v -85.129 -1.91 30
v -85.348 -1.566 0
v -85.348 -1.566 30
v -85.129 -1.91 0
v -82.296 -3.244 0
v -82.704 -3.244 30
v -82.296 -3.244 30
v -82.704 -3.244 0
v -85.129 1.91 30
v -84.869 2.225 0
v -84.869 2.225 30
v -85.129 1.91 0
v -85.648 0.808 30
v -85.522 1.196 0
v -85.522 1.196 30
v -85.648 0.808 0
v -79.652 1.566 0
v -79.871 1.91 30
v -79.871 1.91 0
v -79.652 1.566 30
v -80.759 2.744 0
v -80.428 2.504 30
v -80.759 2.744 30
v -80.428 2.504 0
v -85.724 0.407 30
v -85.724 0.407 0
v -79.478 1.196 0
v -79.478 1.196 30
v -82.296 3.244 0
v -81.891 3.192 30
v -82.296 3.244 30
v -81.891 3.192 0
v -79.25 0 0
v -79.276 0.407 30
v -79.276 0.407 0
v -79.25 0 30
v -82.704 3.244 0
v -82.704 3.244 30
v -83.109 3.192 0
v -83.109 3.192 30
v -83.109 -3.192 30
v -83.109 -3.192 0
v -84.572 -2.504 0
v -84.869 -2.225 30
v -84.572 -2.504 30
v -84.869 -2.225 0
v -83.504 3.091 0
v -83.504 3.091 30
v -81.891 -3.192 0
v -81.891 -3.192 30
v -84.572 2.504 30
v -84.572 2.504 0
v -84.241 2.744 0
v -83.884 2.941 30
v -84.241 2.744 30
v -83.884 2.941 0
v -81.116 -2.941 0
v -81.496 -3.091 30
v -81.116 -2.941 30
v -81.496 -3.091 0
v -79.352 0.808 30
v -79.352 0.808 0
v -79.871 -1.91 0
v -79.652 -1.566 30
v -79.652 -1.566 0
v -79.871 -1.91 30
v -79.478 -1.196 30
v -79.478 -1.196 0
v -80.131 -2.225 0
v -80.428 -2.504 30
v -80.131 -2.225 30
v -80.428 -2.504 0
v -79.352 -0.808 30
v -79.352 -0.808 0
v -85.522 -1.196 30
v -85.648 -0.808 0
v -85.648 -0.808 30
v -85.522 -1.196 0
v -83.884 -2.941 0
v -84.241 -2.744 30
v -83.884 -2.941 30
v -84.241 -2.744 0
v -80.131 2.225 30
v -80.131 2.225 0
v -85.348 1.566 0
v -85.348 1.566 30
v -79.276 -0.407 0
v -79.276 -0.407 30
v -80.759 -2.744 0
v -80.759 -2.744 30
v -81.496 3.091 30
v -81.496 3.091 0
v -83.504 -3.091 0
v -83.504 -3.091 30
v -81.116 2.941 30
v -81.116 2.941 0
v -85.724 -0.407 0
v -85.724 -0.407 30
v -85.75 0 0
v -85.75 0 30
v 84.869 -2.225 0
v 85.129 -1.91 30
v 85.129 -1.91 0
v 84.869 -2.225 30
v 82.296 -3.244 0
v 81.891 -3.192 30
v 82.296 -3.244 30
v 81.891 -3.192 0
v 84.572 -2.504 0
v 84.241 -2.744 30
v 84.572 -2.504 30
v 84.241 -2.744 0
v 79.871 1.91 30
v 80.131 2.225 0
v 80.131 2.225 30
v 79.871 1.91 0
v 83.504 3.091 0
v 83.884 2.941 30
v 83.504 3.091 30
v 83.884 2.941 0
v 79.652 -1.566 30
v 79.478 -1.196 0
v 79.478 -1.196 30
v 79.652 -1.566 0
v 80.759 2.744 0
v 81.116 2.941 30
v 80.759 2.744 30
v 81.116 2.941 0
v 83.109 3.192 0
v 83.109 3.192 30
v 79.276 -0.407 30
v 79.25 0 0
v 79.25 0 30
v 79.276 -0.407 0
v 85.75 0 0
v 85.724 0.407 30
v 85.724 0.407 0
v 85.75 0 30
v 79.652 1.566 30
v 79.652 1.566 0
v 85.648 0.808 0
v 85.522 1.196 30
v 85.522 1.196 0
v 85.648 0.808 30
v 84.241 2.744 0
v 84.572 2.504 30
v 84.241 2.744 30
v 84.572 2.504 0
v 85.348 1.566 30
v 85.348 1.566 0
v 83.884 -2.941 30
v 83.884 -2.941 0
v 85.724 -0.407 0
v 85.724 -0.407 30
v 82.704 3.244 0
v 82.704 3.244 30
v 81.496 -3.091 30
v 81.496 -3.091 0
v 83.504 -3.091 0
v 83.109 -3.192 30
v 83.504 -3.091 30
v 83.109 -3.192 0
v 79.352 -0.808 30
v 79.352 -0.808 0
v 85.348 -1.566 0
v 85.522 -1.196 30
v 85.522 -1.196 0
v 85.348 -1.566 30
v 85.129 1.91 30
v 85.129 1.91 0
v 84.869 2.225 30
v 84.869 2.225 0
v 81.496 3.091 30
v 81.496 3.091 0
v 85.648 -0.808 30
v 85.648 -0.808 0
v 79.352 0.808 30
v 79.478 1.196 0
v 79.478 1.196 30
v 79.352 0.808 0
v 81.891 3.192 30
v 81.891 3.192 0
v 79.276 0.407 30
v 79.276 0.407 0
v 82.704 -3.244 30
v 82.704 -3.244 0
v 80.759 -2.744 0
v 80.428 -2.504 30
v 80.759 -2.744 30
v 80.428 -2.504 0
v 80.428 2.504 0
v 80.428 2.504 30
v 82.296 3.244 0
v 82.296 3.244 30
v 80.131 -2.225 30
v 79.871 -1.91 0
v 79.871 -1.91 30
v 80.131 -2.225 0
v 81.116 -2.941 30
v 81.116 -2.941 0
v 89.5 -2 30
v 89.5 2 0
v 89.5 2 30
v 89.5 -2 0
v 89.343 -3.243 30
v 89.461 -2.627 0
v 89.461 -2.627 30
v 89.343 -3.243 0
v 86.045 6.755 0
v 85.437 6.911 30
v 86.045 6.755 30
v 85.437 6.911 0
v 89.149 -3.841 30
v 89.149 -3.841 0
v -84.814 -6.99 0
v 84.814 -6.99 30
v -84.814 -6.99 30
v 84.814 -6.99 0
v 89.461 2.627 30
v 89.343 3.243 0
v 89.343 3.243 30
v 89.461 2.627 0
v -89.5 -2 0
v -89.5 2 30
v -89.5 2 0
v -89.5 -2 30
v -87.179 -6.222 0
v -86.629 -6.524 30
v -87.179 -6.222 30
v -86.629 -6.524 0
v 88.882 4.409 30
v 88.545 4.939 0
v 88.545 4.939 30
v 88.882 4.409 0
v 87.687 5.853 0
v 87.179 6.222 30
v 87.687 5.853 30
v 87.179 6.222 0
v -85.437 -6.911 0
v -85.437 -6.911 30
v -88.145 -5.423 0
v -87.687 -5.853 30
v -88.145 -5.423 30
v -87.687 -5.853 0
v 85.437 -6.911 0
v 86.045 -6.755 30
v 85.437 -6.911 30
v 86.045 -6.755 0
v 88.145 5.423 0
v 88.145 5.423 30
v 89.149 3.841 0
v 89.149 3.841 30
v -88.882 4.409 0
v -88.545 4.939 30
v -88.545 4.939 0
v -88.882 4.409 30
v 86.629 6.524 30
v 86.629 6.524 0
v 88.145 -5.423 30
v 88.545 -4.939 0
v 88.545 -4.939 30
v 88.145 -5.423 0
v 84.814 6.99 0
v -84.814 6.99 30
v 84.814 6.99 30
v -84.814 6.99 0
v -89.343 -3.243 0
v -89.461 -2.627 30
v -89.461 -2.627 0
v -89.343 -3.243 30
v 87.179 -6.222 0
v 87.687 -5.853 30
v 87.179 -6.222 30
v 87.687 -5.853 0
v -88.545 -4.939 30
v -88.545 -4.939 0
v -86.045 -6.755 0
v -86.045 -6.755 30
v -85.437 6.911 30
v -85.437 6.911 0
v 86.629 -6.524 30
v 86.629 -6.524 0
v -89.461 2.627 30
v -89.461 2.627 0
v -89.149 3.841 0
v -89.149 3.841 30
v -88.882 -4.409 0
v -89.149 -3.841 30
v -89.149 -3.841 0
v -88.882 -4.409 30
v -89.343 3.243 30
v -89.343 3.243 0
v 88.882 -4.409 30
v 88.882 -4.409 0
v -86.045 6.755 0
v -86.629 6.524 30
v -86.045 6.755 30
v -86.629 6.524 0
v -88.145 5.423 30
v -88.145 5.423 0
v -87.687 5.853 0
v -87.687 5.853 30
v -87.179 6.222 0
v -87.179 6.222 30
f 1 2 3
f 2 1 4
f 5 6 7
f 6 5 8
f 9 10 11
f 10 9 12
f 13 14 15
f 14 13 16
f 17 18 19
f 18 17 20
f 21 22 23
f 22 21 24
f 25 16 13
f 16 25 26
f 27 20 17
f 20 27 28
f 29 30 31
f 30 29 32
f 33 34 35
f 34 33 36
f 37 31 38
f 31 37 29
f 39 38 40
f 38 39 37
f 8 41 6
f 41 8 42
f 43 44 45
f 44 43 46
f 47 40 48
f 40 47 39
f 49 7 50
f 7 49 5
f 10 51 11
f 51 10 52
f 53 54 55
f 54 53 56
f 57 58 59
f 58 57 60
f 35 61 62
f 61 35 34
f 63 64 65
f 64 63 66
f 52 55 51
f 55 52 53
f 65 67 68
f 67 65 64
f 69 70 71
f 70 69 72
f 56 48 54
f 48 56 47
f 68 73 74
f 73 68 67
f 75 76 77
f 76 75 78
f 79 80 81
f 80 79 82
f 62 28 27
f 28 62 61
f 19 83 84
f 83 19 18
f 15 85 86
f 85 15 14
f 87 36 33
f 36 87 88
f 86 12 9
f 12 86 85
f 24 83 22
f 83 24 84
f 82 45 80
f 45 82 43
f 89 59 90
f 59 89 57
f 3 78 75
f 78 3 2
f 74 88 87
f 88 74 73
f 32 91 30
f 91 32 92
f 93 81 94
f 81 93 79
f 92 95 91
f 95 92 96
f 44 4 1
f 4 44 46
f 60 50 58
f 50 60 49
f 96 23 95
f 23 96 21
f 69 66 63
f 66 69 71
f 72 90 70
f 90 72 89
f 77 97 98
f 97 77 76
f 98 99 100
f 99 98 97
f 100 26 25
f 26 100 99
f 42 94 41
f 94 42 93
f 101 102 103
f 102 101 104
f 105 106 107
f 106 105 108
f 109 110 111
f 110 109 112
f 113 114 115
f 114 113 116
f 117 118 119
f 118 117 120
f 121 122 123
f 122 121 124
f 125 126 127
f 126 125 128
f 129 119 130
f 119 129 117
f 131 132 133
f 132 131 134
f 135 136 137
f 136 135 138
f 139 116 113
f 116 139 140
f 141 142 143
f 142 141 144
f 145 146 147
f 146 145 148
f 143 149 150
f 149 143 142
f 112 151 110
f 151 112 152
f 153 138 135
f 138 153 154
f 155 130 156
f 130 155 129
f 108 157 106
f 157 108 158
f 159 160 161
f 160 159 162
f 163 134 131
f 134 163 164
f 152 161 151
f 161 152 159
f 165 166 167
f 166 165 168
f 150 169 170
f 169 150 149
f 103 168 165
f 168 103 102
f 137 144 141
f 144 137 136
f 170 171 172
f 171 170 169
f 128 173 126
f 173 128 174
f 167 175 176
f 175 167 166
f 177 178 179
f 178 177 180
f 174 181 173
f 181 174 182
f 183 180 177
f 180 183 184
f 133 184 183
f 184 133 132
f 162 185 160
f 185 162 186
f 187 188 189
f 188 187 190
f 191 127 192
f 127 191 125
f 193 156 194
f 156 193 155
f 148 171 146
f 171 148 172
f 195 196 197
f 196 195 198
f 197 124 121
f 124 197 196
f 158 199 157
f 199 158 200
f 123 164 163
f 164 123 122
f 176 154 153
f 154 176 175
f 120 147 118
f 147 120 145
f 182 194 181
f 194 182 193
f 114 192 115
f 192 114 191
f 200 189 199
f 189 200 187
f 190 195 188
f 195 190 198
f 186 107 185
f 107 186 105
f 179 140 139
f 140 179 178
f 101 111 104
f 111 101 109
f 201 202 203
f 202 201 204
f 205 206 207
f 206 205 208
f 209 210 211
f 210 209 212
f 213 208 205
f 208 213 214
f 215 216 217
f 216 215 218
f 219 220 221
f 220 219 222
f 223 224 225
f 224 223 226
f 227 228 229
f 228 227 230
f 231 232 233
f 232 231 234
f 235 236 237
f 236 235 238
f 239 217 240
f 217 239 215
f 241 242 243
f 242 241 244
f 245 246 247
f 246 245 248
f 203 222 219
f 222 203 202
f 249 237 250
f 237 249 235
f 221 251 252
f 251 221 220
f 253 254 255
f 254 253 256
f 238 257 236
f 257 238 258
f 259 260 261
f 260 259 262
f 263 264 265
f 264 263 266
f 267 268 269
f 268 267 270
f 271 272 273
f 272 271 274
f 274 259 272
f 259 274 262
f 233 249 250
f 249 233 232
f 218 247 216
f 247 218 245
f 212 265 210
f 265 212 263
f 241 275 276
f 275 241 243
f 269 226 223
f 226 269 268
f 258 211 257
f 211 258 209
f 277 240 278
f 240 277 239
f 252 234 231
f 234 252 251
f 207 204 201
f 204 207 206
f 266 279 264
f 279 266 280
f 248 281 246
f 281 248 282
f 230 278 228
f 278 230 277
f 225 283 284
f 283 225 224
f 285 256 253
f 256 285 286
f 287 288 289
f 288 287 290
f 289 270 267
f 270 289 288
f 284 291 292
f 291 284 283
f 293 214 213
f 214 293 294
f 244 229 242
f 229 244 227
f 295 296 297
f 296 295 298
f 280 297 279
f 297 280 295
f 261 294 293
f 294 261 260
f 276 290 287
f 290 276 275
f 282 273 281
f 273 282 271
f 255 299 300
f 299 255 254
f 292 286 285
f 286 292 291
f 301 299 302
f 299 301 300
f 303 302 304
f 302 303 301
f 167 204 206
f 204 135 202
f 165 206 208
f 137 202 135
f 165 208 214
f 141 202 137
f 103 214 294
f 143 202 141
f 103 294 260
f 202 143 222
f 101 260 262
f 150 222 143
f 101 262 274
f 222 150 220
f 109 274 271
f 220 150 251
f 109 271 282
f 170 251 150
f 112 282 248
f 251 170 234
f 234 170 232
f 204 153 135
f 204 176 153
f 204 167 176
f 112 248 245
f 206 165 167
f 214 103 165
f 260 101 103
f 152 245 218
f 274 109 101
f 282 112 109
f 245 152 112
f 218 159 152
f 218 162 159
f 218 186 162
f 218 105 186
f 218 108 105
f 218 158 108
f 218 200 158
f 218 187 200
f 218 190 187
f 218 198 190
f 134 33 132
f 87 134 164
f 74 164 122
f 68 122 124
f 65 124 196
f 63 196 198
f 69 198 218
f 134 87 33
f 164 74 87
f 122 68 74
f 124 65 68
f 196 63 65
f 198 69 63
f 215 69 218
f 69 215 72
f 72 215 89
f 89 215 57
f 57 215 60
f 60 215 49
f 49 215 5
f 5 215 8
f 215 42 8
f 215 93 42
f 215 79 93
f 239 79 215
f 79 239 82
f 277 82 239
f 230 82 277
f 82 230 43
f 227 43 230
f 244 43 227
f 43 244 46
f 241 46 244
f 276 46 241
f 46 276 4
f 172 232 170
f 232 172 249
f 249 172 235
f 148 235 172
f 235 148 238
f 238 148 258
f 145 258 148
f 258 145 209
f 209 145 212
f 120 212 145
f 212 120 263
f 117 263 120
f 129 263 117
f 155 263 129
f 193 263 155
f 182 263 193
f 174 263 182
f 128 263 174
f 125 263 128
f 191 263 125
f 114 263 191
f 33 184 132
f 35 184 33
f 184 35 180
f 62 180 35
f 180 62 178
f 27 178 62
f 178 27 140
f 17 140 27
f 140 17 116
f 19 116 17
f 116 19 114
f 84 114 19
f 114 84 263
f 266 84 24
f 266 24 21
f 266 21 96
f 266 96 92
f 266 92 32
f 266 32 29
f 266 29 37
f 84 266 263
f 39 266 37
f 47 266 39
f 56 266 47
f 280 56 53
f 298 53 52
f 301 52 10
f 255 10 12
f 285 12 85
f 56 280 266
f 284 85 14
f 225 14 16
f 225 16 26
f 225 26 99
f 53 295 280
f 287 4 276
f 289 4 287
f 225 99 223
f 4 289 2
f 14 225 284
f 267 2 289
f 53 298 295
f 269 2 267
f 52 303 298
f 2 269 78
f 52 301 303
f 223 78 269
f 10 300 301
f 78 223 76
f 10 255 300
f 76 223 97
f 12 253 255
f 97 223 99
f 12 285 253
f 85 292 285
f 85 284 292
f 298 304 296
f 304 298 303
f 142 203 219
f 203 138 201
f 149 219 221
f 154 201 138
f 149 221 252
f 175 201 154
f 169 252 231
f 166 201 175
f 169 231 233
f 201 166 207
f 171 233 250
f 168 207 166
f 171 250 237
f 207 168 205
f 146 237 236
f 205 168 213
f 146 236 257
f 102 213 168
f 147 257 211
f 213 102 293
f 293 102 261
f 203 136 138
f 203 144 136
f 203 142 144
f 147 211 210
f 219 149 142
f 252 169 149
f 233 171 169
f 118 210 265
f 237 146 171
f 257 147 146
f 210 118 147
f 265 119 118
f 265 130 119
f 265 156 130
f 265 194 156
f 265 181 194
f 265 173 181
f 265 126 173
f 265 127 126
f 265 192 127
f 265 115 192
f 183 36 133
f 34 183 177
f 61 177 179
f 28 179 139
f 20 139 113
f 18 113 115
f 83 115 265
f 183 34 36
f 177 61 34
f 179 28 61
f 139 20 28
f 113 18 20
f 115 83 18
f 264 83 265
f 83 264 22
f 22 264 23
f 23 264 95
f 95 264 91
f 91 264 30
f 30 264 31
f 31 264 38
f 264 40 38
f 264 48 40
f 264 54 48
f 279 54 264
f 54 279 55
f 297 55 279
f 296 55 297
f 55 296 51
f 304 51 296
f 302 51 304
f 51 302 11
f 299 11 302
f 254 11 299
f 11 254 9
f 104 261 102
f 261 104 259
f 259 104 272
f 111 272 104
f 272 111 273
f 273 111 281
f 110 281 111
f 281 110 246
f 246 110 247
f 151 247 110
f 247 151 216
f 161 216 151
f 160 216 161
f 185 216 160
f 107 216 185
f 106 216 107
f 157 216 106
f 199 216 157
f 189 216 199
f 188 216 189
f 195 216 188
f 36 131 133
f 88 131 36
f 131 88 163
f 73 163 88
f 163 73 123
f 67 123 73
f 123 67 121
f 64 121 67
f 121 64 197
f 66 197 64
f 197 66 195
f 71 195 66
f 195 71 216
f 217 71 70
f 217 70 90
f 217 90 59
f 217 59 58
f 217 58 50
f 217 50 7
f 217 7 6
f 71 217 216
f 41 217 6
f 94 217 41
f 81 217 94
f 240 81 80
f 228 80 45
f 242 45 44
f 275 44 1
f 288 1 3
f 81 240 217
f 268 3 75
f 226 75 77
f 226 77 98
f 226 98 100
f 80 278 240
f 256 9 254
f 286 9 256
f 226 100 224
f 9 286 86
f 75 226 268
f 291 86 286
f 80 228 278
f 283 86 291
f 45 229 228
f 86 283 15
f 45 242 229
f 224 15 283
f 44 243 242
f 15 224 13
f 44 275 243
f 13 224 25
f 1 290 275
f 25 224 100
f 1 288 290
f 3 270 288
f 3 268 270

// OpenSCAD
$fn = 50;


difference() {
	union() {
		hull() {
			translate(v = [-84.5000000000, 2.0000000000, 0]) {
				cylinder(h = 30, r = 5);
			}
			translate(v = [84.5000000000, 2.0000000000, 0]) {
				cylinder(h = 30, r = 5);
			}
			translate(v = [-84.5000000000, -2.0000000000, 0]) {
				cylinder(h = 30, r = 5);
			}
			translate(v = [84.5000000000, -2.0000000000, 0]) {
				cylinder(h = 30, r = 5);
			}
		}
	}
	union() {
		translate(v = [-82.5000000000, 0.0000000000, -100.0000000000]) {
			cylinder(h = 200, r = 3.2500000000);
		}
		translate(v = [-82.5000000000, 0.0000000000, -100.0000000000]) {
			cylinder(h = 200, r = 3.2500000000);
		}
		translate(v = [82.5000000000, 0.0000000000, -100.0000000000]) {
			cylinder(h = 200, r = 3.2500000000);
		}
		translate(v = [82.5000000000, 0.0000000000, -100.0000000000]) {
			cylinder(h = 200, r = 3.2500000000);
		}
	}
}
